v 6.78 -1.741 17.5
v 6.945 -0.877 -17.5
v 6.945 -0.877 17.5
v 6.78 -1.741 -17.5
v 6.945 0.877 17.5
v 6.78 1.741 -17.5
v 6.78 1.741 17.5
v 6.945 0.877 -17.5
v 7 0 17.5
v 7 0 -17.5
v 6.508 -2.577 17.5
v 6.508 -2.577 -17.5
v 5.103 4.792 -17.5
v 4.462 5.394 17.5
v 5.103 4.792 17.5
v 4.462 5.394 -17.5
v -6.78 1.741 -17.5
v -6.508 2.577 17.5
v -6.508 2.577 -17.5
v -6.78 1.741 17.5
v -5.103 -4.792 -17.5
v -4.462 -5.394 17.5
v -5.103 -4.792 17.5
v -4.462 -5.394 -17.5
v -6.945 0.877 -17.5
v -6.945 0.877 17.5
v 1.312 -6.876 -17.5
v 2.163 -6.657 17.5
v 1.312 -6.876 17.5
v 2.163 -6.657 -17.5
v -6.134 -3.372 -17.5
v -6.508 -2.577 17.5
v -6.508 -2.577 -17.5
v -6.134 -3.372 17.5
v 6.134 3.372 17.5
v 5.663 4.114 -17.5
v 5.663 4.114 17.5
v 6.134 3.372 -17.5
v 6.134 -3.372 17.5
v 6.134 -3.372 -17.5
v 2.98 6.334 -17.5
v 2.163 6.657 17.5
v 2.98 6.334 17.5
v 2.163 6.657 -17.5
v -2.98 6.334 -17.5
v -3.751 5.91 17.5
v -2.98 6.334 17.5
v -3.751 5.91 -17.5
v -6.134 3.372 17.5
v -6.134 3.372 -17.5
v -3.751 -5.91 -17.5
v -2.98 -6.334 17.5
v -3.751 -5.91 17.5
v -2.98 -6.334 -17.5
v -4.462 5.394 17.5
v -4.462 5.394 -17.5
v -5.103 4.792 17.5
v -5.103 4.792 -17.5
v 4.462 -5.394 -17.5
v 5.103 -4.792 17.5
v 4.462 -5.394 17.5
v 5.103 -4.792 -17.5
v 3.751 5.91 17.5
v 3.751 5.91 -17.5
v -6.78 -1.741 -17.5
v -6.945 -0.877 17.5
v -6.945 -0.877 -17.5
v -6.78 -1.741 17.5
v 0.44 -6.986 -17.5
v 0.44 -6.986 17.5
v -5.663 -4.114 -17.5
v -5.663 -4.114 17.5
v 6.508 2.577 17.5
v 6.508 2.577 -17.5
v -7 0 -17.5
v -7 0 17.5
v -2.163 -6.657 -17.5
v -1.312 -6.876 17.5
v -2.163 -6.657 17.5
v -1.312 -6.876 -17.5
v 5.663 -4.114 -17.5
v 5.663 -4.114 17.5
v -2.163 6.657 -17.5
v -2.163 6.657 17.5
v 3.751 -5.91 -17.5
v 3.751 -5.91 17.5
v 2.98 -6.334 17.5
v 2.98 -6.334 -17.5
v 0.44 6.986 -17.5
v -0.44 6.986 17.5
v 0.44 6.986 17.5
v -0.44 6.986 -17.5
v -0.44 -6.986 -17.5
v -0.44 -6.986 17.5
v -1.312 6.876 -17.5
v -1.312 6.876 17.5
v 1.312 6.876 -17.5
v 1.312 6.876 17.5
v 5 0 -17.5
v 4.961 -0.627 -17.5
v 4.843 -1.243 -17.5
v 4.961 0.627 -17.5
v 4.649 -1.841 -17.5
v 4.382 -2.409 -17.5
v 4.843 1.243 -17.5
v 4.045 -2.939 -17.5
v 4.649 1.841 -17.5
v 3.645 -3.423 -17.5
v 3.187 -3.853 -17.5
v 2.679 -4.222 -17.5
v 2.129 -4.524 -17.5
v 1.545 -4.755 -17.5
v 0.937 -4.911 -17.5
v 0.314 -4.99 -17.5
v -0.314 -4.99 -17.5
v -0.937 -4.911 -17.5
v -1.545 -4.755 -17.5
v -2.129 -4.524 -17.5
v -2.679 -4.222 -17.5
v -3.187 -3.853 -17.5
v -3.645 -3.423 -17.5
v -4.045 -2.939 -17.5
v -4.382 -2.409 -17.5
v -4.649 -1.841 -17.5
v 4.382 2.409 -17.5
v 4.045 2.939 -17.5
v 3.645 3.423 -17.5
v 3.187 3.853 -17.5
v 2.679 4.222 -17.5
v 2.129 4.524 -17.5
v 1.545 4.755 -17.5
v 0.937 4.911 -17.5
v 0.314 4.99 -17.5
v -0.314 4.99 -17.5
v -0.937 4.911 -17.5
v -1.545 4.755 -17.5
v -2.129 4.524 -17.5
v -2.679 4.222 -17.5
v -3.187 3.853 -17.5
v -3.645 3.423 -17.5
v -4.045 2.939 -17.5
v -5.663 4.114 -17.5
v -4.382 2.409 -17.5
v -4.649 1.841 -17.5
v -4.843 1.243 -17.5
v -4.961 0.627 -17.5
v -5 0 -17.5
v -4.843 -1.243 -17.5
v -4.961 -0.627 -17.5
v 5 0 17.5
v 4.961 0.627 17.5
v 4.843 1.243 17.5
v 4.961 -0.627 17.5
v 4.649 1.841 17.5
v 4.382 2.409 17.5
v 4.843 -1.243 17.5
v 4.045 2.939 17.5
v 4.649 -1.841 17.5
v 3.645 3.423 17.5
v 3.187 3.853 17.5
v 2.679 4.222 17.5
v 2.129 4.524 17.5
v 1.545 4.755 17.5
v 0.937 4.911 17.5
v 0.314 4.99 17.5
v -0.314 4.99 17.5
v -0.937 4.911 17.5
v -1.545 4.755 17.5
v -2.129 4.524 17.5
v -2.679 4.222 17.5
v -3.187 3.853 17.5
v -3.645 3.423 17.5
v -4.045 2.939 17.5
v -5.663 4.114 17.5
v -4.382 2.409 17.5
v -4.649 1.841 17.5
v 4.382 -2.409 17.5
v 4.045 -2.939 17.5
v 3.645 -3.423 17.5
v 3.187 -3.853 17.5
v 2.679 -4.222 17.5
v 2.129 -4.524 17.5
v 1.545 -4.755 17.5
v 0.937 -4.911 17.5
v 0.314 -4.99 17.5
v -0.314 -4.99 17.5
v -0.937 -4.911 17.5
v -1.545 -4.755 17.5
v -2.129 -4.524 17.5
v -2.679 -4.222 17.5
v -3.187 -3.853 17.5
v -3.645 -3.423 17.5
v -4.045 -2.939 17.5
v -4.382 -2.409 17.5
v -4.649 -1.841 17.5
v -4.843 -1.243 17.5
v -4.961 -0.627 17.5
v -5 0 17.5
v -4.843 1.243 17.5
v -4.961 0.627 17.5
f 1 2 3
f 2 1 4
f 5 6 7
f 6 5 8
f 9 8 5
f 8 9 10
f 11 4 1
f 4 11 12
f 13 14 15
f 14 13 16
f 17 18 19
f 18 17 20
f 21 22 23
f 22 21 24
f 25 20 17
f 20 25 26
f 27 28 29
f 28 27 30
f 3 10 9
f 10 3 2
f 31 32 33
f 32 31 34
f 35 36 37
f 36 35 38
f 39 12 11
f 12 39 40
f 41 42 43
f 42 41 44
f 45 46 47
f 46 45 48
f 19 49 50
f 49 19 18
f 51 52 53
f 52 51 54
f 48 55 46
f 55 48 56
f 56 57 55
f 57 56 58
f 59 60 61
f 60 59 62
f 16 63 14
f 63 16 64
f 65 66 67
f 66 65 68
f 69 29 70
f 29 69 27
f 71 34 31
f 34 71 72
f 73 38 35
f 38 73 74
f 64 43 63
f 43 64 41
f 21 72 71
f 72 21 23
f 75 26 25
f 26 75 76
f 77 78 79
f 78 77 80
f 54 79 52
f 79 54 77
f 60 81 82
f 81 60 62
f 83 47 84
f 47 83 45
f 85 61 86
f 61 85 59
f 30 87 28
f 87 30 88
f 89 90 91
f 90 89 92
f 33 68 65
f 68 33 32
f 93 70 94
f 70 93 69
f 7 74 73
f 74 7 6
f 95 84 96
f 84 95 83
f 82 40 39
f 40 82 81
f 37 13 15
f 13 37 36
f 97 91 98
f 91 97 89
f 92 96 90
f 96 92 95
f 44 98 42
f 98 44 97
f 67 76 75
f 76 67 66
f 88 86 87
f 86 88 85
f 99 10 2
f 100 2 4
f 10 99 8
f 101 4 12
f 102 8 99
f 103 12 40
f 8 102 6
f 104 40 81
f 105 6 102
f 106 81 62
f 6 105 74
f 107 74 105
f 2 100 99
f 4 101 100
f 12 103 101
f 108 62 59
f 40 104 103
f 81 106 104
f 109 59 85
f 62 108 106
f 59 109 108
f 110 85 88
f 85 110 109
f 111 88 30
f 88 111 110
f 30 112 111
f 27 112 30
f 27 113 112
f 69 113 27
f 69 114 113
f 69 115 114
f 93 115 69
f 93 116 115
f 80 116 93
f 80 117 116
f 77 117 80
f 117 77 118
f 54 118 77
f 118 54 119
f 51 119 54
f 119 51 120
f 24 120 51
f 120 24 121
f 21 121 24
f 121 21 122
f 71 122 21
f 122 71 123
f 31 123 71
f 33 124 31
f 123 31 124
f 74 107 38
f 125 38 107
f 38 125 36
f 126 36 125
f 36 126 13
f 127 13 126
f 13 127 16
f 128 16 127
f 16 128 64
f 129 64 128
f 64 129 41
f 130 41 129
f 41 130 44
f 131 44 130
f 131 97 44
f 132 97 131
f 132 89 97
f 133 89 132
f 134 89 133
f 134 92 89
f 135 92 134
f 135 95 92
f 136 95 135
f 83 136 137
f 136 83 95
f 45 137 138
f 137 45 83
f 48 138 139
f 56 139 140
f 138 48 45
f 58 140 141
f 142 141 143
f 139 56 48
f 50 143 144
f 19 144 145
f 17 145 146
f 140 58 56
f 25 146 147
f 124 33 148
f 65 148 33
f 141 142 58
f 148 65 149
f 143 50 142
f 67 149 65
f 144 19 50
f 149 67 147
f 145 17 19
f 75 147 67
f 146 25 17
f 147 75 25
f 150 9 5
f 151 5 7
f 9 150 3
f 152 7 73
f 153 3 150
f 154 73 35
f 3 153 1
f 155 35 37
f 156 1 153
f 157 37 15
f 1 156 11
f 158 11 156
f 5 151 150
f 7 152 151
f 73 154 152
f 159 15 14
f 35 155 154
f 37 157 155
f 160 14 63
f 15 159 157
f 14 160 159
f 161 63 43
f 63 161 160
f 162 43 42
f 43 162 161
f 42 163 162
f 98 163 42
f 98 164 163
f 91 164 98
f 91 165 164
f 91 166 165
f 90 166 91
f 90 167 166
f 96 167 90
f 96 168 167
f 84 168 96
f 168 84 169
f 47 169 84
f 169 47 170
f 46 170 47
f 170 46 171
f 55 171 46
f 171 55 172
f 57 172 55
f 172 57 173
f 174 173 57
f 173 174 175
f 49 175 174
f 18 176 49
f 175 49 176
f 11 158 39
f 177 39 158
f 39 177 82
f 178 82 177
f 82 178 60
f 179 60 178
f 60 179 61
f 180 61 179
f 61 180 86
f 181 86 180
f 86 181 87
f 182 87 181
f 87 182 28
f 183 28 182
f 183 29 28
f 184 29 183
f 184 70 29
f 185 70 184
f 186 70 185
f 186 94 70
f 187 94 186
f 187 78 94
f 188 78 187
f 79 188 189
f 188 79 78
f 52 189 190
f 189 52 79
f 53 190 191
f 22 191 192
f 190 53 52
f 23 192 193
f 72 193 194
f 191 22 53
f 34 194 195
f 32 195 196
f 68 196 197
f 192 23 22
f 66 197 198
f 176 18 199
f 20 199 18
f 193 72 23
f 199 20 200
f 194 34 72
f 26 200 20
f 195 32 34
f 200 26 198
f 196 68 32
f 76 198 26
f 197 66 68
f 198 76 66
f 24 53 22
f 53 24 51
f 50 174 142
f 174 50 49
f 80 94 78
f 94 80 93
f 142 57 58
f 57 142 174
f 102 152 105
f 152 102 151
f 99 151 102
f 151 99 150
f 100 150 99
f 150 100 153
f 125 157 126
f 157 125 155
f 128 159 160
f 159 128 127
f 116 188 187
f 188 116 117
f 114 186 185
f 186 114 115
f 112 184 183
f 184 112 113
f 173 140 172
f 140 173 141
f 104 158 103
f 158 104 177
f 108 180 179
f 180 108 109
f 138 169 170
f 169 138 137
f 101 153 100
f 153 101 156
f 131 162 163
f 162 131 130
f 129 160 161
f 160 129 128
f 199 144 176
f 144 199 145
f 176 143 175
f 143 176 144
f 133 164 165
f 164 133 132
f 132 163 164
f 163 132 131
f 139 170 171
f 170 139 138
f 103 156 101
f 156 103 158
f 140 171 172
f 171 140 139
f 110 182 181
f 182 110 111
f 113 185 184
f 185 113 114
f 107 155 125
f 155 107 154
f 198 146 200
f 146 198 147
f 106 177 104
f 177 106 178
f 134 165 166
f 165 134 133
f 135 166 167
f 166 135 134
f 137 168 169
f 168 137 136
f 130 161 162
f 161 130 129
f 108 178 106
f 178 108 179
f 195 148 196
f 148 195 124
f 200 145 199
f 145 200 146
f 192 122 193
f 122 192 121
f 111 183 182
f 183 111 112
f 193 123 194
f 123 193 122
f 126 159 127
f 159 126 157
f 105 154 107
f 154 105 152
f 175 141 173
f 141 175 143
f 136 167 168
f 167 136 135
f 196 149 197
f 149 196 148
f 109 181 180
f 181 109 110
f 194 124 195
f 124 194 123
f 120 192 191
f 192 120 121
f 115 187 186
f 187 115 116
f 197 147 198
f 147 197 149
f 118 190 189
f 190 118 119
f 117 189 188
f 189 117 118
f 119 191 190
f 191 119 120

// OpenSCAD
$fn = 50;


difference() {
	union() {
		translate(v = [0, 0, -17.5000000000]) {
			cylinder(h = 35, r = 7.0000000000);
		}
	}
	union() {
		translate(v = [0, 0, -100.0000000000]) {
			cylinder(h = 200, r = 5.0000000000);
		}
	}
}
